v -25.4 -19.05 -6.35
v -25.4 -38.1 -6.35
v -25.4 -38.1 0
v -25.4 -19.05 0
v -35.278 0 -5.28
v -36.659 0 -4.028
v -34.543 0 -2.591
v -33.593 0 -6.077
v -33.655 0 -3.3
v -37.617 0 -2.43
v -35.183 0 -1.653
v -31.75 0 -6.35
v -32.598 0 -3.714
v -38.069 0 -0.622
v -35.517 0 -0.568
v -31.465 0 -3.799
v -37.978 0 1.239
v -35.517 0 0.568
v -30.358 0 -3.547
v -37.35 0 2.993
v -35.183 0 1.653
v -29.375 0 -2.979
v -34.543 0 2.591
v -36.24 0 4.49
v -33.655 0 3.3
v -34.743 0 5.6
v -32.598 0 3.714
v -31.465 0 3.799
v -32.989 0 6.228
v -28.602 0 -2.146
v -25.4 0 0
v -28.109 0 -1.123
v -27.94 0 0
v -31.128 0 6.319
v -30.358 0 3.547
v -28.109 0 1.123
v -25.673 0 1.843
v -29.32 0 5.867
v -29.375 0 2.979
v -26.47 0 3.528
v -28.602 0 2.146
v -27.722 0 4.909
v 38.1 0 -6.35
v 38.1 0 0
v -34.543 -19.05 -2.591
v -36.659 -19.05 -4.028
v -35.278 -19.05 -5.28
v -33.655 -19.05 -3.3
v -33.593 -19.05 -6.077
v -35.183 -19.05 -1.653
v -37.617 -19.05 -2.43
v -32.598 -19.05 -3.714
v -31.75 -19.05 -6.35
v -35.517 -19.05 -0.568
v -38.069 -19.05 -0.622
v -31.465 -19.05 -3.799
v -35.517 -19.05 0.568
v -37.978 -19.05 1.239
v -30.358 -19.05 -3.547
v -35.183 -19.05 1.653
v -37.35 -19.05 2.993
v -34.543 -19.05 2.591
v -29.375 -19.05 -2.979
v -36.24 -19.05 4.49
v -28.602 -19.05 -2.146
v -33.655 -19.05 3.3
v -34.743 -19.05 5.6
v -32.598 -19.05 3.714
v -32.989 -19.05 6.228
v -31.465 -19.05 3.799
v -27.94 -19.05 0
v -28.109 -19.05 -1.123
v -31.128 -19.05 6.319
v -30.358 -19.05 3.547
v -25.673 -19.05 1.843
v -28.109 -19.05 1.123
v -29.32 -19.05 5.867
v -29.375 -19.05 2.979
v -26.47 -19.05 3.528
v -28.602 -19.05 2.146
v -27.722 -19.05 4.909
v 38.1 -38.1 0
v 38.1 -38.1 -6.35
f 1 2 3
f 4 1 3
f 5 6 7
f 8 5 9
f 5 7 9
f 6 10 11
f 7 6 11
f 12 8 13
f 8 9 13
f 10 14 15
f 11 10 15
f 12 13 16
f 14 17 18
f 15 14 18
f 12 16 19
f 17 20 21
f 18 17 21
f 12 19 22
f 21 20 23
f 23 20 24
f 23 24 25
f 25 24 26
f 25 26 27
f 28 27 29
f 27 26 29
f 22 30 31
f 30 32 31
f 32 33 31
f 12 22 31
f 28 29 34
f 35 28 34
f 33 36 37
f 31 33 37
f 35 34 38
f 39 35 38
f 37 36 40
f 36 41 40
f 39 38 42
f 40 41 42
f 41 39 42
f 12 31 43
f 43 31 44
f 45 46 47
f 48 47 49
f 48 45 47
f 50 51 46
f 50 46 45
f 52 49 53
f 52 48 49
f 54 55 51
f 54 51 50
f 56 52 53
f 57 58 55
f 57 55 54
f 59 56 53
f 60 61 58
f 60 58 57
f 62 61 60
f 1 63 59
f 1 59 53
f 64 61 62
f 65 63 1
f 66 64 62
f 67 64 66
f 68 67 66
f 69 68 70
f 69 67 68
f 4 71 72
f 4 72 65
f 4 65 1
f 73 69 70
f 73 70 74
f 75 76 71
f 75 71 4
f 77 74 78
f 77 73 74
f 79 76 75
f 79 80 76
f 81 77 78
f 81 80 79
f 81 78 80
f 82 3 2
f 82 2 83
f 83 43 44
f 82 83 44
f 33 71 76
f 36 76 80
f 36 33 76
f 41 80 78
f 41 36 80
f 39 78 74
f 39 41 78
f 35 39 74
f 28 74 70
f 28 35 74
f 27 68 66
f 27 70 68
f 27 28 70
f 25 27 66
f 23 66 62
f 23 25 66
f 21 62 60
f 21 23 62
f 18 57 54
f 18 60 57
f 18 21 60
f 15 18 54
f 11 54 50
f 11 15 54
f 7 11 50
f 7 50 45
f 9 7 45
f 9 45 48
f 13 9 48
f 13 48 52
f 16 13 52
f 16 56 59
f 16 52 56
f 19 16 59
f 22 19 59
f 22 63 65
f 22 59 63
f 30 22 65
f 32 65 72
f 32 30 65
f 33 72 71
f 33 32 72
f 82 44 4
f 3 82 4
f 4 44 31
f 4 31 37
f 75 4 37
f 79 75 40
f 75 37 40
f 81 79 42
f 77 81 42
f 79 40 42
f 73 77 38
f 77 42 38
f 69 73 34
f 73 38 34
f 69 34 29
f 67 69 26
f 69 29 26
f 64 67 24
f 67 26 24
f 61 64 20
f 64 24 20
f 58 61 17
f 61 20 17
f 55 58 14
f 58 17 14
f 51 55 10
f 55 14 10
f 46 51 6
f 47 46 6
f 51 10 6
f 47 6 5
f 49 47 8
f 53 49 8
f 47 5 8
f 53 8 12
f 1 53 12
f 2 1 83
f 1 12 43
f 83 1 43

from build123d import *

# Parameters (mm, degrees)
F0_R     = 3.81
F1_DEPTH = 38.1
F3_DEPTH = 19.05


with BuildPart() as f1:
    # F0 (on Front) → F1 (new body)
    with BuildSketch(Plane.XZ):
        with BuildLine():
            Line((-31.75, -6.35), (38.1, -6.35))
            Line((38.1, -6.35), (38.1, 0))
            Line((38.1, 0), (-25.4, 0))
            ThreePointArc((-25.4, 0), (-27.259872, -4.490128), (-31.75, -6.35))
        make_face()
        with Locations((-31.75, 0)):
            Circle(F0_R)
        with BuildLine():
            ThreePointArc((-25.4, 0), (-36.240128, 4.490128), (-31.75, -6.35))
            ThreePointArc((-31.75, -6.35), (-27.259872, -4.490128), (-25.4, 0))
        make_face()
        with Locations((-31.75, 0)):
            Circle(F0_R, mode=Mode.SUBTRACT)
    extrude(amount=F1_DEPTH)

    # F2 (on face) → F3 (cut)
    with BuildSketch(Plane.XZ.offset(38.1)):
        with BuildLine():
            Line((-25.4, -6.35), (-25.4, 0))
            ThreePointArc((-25.4, 0), (-36.240128, 4.490128), (-31.75, -6.35))
            Line((-31.75, -6.35), (-25.4, -6.35))
        make_face()
    extrude(amount=-F3_DEPTH, mode=Mode.SUBTRACT)


solid = f1.part
